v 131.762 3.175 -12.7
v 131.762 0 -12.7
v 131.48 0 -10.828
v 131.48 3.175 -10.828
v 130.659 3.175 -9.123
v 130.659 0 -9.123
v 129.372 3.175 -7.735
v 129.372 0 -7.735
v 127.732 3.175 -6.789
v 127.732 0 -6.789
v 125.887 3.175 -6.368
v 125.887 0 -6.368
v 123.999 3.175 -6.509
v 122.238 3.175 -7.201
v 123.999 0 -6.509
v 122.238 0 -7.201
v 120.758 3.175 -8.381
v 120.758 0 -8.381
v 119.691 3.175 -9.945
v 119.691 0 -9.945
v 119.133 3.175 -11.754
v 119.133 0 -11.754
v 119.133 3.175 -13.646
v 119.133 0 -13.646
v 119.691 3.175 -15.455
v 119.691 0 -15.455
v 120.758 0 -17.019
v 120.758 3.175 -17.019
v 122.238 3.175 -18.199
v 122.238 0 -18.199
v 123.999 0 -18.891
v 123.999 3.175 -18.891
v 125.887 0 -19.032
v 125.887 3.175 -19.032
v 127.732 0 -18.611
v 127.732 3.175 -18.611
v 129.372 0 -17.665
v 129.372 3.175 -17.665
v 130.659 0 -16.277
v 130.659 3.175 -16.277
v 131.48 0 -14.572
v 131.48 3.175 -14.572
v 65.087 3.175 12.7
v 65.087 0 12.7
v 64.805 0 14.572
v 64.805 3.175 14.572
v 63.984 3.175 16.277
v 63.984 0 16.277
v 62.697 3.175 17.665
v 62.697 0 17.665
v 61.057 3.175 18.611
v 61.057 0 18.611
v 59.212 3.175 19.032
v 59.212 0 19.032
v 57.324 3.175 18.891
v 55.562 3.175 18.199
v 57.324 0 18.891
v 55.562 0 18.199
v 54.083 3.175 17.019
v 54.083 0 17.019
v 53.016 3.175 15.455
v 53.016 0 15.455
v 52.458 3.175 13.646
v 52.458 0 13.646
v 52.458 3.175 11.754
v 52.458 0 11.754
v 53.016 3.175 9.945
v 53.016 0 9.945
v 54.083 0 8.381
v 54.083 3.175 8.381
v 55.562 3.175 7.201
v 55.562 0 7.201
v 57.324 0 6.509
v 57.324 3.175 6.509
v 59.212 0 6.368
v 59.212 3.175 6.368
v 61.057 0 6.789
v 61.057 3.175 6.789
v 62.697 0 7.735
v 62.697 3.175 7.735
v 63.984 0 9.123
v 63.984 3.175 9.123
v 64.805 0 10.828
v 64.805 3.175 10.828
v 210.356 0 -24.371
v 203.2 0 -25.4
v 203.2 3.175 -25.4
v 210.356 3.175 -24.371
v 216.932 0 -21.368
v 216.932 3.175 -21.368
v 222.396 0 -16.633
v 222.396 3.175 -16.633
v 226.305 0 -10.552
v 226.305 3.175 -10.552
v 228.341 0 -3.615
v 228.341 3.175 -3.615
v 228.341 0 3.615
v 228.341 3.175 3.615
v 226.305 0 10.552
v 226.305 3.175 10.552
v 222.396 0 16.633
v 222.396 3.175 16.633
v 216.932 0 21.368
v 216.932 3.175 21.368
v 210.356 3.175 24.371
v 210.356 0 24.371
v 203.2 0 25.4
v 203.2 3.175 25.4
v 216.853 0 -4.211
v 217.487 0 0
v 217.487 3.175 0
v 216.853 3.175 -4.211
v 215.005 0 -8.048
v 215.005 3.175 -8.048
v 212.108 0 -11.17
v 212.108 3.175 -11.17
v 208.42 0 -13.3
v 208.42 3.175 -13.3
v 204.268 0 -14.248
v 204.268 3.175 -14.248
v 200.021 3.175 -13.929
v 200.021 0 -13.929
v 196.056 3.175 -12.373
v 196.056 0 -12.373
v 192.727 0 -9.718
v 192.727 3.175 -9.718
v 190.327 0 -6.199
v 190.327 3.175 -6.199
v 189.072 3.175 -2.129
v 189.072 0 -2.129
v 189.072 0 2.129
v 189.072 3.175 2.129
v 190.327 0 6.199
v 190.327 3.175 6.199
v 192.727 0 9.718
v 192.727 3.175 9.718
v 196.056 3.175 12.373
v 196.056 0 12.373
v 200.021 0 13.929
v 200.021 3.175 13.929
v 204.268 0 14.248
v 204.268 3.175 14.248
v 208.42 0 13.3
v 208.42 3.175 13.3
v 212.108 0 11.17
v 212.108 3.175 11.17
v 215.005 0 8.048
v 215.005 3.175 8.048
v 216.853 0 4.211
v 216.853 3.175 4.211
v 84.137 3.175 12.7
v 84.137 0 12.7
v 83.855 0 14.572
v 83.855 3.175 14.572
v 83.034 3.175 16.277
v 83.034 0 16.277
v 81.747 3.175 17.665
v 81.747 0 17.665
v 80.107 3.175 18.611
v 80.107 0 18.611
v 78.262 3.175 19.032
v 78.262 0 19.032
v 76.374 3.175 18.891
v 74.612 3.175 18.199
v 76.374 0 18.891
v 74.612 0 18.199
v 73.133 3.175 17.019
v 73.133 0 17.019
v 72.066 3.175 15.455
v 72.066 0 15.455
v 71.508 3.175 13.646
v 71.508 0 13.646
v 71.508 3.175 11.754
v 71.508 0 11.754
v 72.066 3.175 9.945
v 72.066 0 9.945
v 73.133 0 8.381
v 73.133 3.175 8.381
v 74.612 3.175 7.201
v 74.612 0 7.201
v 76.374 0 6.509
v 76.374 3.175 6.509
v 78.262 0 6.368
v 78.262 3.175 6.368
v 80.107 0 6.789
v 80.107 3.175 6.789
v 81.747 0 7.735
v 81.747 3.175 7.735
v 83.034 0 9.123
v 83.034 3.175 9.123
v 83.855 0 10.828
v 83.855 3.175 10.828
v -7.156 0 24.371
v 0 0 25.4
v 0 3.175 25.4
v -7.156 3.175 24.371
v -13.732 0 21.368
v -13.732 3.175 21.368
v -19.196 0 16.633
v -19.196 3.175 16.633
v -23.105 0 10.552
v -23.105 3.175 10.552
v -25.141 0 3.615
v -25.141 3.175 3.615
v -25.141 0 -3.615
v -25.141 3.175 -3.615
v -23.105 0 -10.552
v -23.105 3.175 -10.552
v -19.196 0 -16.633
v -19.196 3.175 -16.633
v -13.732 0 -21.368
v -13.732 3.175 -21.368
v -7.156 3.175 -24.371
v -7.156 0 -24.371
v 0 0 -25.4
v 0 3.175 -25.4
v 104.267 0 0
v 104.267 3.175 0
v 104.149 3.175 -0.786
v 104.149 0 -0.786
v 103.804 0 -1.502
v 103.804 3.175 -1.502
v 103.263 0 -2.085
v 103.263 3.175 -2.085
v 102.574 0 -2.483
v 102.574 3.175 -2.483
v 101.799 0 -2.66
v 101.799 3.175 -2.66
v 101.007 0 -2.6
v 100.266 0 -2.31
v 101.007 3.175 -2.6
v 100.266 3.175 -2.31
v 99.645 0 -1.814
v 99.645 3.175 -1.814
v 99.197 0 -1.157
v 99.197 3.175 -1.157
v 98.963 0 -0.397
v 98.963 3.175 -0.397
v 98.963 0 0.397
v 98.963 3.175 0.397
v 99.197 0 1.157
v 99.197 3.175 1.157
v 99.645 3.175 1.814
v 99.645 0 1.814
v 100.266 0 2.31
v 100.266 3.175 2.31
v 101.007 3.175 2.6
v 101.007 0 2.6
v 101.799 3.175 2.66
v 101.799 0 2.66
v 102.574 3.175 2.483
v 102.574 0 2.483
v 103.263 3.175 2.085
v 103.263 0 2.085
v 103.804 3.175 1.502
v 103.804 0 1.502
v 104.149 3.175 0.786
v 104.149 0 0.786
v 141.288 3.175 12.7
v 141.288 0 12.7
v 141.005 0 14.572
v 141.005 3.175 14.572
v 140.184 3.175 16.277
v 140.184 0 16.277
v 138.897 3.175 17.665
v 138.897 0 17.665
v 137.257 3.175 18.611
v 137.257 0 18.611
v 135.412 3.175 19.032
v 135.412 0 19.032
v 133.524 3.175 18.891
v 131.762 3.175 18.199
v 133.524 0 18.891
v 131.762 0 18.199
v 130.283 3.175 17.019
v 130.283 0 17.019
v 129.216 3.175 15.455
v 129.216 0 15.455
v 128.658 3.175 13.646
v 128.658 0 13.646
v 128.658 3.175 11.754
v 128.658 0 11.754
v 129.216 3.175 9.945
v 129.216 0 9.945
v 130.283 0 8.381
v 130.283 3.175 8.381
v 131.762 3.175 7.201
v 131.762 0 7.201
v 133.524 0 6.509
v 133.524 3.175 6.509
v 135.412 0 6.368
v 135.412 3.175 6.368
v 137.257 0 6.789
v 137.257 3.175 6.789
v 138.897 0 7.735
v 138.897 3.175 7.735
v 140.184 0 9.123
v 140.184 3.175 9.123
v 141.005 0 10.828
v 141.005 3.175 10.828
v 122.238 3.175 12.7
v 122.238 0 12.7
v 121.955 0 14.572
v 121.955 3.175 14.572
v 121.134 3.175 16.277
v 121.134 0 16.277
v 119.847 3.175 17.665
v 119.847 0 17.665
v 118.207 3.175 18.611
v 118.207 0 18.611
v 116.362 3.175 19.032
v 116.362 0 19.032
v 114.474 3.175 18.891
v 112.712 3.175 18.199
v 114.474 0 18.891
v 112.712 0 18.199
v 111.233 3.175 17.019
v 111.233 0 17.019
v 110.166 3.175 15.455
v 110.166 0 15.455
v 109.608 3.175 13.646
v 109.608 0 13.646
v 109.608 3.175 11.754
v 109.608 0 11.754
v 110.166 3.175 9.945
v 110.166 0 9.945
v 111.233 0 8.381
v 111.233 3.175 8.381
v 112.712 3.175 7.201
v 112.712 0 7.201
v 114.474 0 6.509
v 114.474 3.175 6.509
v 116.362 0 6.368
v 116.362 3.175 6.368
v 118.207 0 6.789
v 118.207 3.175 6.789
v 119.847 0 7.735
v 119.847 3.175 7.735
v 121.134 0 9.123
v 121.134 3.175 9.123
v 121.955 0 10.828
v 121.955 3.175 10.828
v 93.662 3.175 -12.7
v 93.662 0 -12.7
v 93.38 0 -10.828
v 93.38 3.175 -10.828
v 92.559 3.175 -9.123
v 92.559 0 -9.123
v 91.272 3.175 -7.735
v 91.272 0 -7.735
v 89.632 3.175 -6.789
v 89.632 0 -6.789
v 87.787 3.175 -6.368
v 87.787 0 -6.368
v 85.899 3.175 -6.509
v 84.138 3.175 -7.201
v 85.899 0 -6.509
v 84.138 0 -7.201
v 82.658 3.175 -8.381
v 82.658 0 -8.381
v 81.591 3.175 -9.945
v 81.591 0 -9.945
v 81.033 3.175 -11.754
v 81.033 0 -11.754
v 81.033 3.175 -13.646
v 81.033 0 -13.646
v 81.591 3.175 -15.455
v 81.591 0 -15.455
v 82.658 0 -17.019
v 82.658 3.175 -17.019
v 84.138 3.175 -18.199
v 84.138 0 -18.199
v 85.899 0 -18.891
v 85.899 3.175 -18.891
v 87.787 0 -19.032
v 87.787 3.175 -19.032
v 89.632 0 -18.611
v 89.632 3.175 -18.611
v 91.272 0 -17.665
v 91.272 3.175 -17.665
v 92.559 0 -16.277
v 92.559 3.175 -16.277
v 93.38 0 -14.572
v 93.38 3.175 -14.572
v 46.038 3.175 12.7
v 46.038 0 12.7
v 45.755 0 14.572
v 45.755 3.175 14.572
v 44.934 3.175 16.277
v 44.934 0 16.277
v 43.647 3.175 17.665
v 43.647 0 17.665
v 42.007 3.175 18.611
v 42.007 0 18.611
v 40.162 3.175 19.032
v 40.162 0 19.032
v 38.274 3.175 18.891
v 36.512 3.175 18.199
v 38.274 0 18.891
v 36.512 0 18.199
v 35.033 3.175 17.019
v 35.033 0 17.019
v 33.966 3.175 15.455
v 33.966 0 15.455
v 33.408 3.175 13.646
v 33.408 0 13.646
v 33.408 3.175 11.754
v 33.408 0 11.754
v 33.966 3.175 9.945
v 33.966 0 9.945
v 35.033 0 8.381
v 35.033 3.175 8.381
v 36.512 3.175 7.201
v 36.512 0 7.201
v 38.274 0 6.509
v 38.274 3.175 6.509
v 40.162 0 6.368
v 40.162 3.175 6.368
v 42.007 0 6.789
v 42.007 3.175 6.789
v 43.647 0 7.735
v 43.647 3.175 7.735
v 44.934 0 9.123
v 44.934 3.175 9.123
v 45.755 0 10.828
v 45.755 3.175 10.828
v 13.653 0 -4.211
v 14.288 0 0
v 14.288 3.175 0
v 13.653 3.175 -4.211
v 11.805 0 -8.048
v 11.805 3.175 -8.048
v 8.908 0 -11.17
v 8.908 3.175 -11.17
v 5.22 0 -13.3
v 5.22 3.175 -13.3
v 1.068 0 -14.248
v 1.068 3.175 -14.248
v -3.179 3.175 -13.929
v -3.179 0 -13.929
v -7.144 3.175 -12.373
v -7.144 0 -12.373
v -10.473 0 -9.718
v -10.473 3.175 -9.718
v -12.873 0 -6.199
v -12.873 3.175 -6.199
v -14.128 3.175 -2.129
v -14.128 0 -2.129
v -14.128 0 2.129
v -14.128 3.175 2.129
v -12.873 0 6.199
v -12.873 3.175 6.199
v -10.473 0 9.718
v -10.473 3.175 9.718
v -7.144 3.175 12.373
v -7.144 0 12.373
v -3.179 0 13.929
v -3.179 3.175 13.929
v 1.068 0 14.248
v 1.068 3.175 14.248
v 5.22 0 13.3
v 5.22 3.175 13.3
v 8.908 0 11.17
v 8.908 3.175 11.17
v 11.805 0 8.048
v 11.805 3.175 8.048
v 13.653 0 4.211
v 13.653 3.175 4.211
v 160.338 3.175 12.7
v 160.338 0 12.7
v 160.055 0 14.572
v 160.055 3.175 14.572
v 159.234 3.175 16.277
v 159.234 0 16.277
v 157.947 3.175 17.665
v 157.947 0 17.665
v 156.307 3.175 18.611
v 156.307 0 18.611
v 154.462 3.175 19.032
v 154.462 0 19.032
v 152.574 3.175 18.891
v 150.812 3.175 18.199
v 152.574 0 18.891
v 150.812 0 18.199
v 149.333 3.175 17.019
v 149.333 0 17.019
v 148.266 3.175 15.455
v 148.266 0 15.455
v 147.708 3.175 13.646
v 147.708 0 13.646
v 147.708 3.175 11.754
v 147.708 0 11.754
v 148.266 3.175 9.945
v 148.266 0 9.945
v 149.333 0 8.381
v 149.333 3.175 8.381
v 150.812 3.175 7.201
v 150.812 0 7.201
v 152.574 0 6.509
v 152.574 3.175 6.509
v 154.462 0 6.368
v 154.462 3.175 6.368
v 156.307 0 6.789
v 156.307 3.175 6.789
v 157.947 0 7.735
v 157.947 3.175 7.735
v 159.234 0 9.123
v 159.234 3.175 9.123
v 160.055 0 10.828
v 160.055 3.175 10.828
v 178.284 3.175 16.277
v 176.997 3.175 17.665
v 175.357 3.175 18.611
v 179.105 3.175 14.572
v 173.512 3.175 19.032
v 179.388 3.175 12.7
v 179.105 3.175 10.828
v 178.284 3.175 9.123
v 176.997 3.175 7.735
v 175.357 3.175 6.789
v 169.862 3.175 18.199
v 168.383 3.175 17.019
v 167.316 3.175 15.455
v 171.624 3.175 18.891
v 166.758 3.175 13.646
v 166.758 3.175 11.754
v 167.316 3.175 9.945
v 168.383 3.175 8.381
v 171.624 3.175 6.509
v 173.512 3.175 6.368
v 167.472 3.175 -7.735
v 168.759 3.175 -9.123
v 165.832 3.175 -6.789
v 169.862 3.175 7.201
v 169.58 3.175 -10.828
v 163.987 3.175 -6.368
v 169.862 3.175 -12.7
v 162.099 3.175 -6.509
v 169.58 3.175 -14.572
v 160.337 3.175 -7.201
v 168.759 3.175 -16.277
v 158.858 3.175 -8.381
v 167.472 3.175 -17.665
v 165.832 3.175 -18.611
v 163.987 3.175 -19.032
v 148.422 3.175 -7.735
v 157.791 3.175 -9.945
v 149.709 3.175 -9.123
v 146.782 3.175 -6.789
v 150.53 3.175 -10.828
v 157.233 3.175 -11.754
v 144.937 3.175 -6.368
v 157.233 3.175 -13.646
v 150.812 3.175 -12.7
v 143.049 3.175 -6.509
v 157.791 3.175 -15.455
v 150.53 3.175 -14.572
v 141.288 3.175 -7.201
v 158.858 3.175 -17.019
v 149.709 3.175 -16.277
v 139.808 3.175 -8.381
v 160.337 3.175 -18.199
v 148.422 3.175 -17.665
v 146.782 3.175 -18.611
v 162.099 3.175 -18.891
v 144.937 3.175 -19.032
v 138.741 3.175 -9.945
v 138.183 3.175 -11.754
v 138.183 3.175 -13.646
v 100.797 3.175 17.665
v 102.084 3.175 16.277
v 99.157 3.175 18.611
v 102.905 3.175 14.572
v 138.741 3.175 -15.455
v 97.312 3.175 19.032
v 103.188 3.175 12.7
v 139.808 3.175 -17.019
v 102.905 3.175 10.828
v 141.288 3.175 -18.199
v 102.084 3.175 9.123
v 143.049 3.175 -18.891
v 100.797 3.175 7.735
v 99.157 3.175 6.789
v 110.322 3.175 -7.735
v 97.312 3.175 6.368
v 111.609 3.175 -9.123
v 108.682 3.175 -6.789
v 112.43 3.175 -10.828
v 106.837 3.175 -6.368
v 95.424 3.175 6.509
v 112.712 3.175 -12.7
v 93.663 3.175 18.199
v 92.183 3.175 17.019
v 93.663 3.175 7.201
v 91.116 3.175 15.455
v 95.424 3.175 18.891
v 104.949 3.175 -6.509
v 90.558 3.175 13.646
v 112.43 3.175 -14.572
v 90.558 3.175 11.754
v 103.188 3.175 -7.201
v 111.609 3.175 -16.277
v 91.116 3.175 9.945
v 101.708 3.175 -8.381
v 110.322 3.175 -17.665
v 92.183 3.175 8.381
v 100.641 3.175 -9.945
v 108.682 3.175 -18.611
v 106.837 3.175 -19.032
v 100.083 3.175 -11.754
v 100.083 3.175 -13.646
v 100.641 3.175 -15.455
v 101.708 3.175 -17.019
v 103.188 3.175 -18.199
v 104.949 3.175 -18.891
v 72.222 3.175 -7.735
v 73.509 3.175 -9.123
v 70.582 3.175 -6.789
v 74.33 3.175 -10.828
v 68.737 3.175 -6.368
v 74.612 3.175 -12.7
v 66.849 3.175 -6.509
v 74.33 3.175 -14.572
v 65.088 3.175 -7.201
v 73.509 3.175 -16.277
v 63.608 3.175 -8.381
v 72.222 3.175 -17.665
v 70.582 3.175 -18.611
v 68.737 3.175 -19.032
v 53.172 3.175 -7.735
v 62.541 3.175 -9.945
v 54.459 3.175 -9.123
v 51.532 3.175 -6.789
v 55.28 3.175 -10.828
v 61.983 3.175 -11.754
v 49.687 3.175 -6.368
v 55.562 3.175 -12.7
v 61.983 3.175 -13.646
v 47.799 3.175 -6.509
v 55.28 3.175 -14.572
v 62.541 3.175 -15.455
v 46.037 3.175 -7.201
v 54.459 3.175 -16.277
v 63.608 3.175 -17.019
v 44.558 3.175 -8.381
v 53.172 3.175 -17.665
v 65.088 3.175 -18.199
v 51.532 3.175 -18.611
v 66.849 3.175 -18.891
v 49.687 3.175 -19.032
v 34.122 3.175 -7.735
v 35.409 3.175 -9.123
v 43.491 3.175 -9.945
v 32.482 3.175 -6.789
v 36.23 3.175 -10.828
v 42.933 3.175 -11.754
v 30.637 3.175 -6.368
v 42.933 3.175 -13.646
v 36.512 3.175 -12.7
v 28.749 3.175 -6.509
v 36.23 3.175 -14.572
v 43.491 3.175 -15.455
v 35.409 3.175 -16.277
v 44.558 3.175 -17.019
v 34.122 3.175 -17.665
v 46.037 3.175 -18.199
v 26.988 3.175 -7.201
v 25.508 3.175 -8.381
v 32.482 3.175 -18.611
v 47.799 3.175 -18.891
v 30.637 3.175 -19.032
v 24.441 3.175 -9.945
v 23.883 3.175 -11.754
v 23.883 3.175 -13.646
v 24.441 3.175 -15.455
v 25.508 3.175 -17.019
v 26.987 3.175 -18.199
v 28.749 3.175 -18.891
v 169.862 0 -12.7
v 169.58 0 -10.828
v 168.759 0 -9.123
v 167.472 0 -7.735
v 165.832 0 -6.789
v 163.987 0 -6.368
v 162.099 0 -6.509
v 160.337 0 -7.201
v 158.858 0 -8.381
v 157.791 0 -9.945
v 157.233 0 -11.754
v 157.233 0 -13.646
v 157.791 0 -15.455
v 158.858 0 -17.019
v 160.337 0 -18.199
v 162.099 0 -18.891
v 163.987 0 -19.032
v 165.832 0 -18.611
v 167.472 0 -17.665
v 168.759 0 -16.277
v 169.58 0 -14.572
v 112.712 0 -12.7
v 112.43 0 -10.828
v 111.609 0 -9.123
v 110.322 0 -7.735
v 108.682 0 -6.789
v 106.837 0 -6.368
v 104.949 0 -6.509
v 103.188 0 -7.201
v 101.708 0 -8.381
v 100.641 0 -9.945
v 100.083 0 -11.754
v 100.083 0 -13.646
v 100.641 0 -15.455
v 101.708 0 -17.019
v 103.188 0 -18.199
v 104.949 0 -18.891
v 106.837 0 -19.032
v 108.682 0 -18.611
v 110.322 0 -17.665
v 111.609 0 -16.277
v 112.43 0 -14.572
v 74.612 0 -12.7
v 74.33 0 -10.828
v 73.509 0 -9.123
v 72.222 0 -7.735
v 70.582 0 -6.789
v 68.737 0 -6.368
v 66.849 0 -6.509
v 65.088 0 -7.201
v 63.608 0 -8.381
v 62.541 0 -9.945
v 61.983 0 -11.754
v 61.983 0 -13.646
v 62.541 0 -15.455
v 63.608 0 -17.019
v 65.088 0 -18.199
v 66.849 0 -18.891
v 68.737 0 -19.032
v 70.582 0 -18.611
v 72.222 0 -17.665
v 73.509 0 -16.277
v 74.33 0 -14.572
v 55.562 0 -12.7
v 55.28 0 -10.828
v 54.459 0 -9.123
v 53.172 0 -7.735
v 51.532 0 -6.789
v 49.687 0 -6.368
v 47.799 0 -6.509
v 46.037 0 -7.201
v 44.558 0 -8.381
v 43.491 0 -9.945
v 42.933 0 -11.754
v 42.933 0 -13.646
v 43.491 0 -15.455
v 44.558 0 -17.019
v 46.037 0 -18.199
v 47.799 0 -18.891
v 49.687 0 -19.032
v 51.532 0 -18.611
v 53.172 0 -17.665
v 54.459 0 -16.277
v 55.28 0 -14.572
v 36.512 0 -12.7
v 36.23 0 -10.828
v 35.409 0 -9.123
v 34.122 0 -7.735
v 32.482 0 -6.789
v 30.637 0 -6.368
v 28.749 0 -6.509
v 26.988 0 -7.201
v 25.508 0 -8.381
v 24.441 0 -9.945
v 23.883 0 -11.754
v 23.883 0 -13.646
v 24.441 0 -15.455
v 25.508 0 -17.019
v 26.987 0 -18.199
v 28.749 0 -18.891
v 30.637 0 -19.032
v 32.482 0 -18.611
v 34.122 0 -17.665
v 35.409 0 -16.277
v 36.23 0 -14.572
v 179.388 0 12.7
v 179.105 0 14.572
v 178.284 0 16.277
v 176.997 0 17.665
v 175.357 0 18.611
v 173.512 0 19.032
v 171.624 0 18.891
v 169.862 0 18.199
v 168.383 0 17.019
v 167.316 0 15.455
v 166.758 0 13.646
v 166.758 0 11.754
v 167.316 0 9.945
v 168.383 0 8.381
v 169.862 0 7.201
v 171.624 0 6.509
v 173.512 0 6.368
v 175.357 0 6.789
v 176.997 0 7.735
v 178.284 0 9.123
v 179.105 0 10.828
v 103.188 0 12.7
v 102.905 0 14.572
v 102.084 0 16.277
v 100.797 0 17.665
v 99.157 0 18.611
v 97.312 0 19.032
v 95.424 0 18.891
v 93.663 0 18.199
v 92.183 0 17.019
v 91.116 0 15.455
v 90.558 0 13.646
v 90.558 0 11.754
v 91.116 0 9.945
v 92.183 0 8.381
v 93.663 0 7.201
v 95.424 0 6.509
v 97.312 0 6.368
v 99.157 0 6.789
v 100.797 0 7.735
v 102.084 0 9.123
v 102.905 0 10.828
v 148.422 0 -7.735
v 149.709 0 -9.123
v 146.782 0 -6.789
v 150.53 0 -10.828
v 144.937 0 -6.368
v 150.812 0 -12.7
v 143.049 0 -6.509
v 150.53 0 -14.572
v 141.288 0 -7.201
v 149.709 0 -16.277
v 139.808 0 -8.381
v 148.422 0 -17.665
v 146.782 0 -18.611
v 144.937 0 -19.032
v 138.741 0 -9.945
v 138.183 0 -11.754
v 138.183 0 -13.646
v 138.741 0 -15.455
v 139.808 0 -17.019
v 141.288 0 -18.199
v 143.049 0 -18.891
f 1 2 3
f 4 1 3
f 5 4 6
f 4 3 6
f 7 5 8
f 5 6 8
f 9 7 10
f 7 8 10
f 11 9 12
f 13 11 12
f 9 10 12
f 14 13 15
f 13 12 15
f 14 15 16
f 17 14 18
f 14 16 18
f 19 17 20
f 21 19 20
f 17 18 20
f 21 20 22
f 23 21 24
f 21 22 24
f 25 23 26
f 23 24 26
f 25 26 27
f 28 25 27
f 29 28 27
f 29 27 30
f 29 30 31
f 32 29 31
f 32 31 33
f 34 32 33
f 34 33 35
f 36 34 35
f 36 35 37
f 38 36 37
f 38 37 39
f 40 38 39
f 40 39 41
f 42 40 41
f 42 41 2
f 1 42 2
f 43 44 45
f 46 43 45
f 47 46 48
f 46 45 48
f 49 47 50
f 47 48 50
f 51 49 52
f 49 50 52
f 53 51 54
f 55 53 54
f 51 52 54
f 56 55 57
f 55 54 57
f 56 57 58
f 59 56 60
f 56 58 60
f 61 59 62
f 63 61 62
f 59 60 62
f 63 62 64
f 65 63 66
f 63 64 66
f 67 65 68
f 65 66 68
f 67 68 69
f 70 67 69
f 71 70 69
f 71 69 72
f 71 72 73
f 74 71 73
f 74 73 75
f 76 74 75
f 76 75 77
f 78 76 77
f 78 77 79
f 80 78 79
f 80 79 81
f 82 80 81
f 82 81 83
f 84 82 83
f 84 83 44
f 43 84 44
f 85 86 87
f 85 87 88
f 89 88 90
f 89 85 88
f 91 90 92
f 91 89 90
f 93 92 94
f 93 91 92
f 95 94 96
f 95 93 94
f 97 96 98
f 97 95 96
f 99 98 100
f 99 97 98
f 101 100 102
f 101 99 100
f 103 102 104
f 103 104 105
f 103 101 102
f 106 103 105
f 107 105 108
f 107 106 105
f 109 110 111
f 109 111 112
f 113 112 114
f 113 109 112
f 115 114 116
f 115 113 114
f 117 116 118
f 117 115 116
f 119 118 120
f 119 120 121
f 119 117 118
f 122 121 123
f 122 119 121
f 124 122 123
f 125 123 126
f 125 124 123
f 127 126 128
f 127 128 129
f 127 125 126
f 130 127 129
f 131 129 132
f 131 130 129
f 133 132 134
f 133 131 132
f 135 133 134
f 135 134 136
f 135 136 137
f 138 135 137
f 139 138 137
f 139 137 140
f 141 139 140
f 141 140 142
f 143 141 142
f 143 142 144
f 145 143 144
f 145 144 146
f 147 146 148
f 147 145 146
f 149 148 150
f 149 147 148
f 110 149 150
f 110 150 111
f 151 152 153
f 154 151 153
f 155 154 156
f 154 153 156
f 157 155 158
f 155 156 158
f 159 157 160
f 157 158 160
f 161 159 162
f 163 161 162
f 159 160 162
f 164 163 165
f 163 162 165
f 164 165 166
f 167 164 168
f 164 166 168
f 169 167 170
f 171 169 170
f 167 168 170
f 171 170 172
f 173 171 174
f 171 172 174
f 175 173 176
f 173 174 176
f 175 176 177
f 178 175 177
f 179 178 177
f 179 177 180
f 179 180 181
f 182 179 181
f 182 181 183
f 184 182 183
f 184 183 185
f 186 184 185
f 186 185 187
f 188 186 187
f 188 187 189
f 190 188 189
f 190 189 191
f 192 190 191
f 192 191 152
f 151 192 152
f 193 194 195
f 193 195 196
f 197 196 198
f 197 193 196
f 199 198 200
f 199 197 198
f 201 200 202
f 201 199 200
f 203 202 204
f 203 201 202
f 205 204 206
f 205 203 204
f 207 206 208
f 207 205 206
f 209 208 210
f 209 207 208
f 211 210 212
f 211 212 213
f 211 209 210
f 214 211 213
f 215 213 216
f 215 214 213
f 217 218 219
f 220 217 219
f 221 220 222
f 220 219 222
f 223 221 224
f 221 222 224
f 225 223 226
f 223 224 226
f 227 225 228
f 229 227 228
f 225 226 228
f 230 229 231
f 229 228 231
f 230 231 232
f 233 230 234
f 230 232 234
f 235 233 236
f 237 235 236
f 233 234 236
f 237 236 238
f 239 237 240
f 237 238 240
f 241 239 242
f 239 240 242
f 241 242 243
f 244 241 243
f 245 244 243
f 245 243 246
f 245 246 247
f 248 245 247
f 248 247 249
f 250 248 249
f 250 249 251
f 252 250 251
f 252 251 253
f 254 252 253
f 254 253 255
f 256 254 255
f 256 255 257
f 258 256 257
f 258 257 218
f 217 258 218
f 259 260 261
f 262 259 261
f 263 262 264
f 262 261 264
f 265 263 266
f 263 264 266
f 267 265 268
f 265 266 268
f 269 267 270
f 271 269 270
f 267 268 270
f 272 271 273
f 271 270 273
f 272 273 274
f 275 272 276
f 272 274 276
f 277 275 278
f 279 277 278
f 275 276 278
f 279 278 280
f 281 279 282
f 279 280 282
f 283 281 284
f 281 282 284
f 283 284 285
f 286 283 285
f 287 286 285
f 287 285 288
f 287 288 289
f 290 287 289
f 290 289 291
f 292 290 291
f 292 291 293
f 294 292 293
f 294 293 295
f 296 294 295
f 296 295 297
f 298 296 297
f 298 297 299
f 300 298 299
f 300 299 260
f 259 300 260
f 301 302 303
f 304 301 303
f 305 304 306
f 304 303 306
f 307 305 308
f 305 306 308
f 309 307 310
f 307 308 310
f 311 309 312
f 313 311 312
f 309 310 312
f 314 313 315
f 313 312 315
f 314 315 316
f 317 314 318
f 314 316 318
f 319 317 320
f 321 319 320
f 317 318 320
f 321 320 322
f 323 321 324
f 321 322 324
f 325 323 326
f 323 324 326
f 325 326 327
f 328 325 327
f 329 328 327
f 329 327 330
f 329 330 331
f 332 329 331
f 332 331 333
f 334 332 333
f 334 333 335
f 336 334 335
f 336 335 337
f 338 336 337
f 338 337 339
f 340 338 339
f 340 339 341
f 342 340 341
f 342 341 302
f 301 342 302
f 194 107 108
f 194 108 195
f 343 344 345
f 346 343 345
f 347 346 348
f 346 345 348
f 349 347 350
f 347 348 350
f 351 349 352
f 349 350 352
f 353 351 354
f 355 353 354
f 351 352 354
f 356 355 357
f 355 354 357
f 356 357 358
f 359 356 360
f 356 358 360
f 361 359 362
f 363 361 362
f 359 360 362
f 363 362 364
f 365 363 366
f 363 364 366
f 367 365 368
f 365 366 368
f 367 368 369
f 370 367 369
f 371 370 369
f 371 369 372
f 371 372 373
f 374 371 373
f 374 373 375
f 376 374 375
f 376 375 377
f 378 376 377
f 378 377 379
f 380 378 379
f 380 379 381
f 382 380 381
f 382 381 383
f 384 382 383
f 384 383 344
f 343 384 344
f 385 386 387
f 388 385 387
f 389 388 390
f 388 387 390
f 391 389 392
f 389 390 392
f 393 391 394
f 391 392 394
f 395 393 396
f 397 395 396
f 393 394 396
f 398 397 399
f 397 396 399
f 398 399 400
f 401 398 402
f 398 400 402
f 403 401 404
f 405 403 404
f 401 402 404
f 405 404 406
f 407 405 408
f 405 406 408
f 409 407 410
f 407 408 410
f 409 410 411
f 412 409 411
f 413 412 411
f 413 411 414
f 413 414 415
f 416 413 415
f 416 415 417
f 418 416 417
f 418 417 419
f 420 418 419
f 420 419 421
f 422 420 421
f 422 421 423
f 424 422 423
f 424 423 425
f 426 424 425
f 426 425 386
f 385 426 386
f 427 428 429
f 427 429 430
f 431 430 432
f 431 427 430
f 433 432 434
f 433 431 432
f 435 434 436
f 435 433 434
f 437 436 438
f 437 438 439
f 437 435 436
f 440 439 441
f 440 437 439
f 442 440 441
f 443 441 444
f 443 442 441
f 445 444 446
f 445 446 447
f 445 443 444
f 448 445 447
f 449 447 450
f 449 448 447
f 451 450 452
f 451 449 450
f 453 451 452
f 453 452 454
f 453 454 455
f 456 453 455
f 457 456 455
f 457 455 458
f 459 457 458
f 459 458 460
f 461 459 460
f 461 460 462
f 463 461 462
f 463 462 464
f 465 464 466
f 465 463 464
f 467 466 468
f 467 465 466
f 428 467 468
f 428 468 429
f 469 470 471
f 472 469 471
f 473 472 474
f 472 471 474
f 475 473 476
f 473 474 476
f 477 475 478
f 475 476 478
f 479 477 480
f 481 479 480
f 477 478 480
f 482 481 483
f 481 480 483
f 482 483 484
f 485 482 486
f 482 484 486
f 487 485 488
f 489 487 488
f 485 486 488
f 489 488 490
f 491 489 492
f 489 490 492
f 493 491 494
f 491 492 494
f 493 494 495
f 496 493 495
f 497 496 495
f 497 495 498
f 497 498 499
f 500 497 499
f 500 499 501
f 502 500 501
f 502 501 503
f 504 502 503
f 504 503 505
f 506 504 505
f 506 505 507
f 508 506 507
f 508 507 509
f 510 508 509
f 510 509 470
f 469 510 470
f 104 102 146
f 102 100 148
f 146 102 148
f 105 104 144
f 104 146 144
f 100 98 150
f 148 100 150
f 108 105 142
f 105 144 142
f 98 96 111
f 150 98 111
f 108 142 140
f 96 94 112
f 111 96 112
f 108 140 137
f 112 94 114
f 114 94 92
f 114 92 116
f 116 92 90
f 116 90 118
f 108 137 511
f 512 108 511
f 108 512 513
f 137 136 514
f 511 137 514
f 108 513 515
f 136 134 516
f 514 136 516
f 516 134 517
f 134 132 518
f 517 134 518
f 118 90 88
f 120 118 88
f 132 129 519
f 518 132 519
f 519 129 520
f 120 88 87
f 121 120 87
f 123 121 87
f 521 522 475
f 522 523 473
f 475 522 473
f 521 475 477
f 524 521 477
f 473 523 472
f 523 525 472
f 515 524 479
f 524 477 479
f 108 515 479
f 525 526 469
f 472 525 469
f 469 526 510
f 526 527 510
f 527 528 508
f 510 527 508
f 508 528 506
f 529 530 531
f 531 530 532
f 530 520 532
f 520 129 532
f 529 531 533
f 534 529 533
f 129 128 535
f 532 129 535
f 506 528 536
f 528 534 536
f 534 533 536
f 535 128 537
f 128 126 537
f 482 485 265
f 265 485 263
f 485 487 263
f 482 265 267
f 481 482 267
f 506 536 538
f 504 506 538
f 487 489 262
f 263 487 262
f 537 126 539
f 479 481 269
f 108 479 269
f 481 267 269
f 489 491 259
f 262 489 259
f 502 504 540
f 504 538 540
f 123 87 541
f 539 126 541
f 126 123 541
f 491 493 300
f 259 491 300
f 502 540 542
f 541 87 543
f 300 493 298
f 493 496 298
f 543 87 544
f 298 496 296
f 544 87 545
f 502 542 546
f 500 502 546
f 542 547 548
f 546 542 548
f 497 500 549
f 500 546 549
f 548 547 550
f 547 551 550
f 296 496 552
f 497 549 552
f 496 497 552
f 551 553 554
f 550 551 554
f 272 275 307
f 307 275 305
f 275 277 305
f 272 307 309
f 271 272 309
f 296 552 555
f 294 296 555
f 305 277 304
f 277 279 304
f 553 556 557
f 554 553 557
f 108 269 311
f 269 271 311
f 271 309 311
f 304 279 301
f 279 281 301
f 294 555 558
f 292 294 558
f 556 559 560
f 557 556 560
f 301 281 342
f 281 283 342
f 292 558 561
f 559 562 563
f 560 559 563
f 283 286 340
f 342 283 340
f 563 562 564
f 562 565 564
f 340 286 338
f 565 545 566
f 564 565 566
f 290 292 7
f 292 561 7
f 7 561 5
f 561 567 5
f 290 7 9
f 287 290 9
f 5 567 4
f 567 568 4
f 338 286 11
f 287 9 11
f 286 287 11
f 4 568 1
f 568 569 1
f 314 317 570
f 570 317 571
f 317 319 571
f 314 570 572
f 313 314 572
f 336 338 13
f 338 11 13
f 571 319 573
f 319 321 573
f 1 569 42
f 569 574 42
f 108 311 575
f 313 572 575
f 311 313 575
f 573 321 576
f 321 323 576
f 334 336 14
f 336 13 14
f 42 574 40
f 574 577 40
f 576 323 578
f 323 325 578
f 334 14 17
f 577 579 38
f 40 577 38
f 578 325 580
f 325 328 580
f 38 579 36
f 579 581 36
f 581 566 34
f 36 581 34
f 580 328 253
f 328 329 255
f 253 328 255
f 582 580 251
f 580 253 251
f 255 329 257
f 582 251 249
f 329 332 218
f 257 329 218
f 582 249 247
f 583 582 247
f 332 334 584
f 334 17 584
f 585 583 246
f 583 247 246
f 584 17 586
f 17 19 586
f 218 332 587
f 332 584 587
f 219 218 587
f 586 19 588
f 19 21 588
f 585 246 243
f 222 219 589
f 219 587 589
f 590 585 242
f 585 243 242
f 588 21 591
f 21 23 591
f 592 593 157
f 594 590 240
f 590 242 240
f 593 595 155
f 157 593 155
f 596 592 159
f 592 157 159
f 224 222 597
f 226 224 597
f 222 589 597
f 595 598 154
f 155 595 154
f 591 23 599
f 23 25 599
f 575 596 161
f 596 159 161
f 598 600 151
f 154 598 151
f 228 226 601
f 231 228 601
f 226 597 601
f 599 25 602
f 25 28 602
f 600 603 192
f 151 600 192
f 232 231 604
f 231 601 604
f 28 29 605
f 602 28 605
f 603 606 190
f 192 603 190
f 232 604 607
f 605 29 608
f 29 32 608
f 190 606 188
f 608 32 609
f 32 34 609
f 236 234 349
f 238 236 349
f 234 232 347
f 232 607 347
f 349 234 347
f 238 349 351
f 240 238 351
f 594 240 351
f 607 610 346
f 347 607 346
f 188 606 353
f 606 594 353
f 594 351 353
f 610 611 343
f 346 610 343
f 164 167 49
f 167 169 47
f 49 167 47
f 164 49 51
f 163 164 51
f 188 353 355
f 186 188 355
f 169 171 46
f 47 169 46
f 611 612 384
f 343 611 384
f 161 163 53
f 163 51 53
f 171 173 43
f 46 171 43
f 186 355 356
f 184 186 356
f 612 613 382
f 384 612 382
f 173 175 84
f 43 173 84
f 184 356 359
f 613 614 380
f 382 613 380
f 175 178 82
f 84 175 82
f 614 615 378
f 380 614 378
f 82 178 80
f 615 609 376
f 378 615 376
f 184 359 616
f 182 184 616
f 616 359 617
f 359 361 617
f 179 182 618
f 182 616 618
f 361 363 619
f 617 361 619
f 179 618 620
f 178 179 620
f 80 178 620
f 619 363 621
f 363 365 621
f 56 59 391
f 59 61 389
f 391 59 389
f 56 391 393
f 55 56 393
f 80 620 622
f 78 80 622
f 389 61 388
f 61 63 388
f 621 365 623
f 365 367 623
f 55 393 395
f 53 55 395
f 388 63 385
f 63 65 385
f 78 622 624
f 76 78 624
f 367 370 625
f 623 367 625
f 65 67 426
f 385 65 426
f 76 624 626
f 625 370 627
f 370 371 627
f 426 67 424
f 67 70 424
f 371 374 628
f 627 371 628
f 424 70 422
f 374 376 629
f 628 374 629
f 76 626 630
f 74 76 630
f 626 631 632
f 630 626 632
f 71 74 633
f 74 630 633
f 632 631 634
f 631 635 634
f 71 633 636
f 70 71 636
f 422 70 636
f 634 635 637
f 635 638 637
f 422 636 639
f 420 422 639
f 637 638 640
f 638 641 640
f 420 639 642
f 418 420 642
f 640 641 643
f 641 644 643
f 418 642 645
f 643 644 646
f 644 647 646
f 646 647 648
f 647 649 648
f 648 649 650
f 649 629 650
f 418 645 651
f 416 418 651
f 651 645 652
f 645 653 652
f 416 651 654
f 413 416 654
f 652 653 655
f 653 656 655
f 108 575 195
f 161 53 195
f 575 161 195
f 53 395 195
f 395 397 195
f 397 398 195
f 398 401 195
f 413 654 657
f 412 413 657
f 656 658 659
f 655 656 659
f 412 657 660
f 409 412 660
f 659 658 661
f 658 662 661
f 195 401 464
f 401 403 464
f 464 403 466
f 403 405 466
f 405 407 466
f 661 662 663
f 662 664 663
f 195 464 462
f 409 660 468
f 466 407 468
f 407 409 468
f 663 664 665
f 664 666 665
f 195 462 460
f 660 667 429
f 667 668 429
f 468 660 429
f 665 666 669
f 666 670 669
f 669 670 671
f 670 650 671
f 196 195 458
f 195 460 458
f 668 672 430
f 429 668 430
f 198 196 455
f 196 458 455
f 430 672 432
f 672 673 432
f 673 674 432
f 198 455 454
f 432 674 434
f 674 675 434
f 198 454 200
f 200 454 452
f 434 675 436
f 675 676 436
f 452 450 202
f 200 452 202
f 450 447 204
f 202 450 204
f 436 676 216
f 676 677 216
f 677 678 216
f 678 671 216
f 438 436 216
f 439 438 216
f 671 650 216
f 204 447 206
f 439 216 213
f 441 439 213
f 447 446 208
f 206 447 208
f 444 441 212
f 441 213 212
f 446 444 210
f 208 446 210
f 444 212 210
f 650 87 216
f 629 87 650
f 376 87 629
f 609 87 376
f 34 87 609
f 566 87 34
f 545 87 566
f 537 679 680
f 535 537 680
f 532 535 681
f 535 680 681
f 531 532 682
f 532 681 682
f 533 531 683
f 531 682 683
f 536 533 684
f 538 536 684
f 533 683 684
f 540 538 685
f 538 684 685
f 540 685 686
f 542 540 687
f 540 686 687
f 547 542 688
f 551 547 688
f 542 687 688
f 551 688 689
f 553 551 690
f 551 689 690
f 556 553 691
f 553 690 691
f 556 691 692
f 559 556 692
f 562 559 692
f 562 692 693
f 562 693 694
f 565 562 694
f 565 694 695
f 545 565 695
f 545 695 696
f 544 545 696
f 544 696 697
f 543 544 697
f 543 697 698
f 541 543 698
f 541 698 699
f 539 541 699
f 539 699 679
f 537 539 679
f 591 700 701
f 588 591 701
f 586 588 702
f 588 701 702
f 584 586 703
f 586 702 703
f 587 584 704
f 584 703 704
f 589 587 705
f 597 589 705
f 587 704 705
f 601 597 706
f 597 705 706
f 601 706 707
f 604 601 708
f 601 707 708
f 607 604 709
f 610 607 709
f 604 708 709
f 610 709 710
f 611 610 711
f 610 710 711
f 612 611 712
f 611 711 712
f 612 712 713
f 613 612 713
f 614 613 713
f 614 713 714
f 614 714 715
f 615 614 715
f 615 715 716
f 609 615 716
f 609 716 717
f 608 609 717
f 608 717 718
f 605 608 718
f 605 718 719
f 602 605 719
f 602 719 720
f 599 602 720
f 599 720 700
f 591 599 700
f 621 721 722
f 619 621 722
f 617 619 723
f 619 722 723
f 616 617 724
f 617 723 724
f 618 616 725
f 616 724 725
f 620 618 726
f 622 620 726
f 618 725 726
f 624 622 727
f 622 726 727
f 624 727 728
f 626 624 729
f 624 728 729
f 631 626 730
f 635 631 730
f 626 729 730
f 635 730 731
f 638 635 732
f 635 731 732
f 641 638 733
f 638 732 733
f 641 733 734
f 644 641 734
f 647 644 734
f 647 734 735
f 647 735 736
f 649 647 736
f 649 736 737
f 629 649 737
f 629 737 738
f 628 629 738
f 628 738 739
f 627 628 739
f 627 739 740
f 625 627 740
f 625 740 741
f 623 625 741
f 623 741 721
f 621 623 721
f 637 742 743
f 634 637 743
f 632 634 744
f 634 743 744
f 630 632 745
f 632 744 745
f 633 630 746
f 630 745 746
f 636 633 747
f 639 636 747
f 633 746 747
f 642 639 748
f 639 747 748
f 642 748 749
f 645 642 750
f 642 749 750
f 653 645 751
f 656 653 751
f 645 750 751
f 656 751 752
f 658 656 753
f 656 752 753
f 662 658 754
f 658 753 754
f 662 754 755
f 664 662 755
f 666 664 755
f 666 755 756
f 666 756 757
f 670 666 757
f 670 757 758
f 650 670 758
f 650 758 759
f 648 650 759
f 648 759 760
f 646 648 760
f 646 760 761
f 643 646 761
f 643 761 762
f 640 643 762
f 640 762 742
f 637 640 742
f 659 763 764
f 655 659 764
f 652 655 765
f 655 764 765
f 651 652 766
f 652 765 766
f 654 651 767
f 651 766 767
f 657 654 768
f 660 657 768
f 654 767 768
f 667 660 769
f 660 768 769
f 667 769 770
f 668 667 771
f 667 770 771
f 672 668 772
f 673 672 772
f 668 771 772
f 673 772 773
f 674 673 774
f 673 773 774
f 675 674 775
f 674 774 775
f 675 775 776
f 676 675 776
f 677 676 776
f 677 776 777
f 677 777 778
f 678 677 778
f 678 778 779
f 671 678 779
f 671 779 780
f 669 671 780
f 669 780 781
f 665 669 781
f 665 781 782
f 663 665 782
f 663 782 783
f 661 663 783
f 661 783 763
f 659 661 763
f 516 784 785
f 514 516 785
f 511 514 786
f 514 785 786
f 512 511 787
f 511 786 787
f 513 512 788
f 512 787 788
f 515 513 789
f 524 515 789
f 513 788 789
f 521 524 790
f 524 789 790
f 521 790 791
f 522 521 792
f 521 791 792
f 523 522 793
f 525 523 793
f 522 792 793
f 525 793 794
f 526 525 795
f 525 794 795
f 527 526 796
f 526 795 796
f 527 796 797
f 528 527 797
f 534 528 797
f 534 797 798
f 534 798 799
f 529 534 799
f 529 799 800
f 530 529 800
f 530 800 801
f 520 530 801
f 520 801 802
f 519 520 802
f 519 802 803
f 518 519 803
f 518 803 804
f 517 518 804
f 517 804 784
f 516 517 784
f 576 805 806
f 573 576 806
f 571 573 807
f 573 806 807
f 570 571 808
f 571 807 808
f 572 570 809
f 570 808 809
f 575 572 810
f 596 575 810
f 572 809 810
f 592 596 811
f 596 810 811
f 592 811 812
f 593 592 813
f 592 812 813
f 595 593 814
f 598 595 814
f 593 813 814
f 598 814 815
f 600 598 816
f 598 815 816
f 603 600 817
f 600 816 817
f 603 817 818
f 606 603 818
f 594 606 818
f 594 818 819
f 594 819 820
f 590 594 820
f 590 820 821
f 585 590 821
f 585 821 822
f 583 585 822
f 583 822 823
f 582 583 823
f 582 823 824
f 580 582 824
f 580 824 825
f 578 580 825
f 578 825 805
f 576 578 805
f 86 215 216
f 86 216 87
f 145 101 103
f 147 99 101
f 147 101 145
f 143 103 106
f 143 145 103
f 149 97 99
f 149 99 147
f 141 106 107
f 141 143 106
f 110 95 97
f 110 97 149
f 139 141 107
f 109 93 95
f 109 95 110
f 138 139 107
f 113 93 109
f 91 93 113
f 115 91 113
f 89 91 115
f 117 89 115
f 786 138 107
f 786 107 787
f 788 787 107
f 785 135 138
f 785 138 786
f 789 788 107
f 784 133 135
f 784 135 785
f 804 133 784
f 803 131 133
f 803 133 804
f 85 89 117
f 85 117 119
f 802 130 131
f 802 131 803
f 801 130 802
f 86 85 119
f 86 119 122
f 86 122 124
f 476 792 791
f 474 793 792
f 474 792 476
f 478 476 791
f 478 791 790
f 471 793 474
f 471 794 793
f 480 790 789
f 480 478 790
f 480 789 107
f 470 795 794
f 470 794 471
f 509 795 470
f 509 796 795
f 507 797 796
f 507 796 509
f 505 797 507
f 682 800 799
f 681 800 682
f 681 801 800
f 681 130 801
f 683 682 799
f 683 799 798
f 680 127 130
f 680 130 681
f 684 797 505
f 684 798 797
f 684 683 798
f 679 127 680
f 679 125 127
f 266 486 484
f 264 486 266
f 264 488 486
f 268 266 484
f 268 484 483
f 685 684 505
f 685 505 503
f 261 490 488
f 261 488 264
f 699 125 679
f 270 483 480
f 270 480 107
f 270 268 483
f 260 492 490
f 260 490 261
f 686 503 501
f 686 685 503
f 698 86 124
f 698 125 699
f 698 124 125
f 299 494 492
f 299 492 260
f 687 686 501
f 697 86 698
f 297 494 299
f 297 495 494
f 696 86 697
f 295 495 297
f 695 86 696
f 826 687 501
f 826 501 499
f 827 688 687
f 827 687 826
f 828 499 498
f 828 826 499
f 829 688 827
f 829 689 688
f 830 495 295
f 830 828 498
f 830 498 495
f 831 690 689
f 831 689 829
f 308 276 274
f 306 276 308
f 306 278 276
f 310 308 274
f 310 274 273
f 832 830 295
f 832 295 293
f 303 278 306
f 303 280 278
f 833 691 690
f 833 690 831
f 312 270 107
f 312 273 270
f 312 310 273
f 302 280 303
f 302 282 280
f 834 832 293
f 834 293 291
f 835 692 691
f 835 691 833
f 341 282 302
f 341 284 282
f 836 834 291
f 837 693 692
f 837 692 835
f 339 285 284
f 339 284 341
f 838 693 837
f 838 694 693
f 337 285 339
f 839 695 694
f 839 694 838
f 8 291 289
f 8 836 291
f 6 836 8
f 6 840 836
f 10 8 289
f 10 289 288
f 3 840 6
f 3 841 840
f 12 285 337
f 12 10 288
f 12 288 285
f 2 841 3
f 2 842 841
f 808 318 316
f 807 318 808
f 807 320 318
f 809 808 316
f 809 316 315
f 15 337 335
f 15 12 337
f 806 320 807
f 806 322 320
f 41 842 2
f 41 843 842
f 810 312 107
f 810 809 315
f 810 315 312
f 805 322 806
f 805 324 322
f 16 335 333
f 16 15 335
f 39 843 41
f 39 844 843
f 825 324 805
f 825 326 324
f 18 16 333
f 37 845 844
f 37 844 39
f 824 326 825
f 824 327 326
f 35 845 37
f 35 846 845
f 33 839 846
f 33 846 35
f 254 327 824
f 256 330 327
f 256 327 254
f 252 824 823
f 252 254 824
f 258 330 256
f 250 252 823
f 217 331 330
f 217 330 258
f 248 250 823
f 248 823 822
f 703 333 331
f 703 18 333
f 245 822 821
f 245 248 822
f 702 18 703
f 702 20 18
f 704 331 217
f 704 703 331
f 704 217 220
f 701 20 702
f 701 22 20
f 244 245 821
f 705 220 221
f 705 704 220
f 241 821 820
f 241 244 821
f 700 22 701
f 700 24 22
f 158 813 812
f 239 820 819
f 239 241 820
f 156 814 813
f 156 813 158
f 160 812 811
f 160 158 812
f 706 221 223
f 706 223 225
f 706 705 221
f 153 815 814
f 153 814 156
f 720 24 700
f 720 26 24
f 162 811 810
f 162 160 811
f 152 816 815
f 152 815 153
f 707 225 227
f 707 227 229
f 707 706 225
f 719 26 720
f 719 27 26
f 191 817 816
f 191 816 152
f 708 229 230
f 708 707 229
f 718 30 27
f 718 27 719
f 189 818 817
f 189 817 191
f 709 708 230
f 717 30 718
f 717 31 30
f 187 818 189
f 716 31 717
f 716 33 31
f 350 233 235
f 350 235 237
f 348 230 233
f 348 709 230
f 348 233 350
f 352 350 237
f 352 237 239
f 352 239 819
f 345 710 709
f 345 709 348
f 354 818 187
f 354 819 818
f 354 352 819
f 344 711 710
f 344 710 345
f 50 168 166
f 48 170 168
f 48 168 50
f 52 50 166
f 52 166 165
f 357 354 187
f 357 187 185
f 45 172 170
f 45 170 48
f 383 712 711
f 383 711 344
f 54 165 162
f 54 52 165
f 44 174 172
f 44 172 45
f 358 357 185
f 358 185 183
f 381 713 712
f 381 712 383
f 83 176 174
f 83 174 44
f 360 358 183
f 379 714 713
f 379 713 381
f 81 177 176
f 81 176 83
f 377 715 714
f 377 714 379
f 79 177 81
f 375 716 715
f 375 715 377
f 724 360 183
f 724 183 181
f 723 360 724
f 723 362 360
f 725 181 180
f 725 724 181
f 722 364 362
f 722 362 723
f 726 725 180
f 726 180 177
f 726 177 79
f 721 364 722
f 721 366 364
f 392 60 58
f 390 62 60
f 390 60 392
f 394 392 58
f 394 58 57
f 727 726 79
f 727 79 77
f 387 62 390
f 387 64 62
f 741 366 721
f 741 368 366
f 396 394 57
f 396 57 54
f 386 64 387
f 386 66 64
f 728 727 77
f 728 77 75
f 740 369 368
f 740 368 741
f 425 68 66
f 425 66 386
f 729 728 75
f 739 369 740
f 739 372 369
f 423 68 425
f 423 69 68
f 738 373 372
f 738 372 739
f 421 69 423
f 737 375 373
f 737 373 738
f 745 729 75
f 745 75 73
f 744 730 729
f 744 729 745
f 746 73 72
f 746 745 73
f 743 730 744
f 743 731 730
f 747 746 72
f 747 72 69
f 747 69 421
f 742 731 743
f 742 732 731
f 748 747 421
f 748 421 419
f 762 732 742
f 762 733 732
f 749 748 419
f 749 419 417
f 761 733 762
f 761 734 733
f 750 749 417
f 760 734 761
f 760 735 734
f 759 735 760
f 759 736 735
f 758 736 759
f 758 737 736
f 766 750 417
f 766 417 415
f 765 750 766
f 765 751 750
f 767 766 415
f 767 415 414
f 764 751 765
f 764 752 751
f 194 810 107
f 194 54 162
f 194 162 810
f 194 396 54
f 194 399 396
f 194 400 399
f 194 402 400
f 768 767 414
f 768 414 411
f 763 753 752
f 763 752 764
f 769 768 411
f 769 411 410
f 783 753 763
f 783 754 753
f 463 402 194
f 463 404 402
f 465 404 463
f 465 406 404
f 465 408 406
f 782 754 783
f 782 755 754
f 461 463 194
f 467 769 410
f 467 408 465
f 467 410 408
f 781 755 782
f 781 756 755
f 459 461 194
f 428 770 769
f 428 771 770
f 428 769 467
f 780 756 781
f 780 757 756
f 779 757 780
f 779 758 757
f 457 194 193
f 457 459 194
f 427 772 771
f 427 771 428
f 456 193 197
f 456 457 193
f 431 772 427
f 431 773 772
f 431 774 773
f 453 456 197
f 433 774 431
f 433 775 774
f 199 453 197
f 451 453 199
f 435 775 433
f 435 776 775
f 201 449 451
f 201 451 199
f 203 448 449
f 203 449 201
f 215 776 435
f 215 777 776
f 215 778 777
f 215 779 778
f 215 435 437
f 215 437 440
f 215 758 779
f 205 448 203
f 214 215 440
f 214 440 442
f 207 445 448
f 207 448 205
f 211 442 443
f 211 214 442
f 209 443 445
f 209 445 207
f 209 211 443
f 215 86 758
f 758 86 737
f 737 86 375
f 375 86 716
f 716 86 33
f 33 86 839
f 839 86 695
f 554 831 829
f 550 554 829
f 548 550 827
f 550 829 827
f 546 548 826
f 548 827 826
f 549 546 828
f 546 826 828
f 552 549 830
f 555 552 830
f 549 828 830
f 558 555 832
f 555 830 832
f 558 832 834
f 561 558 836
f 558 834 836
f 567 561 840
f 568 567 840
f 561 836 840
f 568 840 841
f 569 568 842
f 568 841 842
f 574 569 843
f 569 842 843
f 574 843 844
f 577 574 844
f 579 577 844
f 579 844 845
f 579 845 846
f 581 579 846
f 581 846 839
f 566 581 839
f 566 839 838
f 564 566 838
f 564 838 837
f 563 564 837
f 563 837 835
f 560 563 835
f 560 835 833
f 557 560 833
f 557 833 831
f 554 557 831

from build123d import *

# Parameters (mm, degrees)
SKETCH1_R           = 14.2875
BOSS_EXTRUDE1_DEPTH = 3.175
CUT_EXTRUDE1_REACH  = 5.175
SKETCH2_R           = 2.667
CUT_EXTRUDE2_REACH  = 5.175
SKETCH4_R           = 6.35


with BuildPart() as part:
    # Sketch1 → Boss-Extrude1 (new body)
    with BuildSketch(Plane(origin=(0, 0, 0), x_dir=(1, 0, 0), z_dir=(0, 1, 0))):
        with BuildLine():
            Line((0, 25.4), (203.2, 25.4))
            ThreePointArc((203.2, 25.4), (228.6, 0), (203.2, -25.4))
            Line((203.2, -25.4), (0, -25.4))
            ThreePointArc((0, -25.4), (-25.4, 0), (0, 25.4))
        make_face()
        Circle(SKETCH1_R, mode=Mode.SUBTRACT)
        with Locations((203.2, 0)):
            Circle(SKETCH1_R, mode=Mode.SUBTRACT)
    extrude(amount=BOSS_EXTRUDE1_DEPTH)

    # Sketch2 → Cut-Extrude1 (cut, up to next)
    with BuildSketch(Plane(origin=(0, 3.175, 0), x_dir=(1, 0, 0), z_dir=(0, 1, 0)), mode=Mode.PRIVATE) as cut_extrude1_sk1:
        with Locations((101.6, 0)):
            Circle(SKETCH2_R)
    cut_extrude1_tool1 = extrude(cut_extrude1_sk1.sketch, amount=-CUT_EXTRUDE1_REACH, mode=Mode.PRIVATE) & part.part
    add(cut_extrude1_tool1.solids().sort_by_distance((101.6, 3.175, 0))[0], mode=Mode.SUBTRACT)

    # Sketch4 → Cut-Extrude2 (cut, up to next)
    with BuildSketch(Plane.XZ, mode=Mode.PRIVATE) as cut_extrude2_sk1:
        with Locations((30.1625, -12.7)):
            Circle(SKETCH4_R)
    cut_extrude2_tool1 = extrude(cut_extrude2_sk1.sketch, amount=-CUT_EXTRUDE2_REACH, mode=Mode.PRIVATE) & part.part
    add(cut_extrude2_tool1.solids().sort_by_distance((30.1625, 0, -12.7))[0], mode=Mode.SUBTRACT)
    # Sketch4 → Cut-Extrude2 (cut, up to next)
    with BuildSketch(Plane.XZ, mode=Mode.PRIVATE) as cut_extrude2_sk2:
        with Locations((49.2125, -12.7)):
            Circle(SKETCH4_R)
    cut_extrude2_tool2 = extrude(cut_extrude2_sk2.sketch, amount=-CUT_EXTRUDE2_REACH, mode=Mode.PRIVATE) & part.part
    add(cut_extrude2_tool2.solids().sort_by_distance((49.2125, 0, -12.7))[0], mode=Mode.SUBTRACT)
    # Sketch4 → Cut-Extrude2 (cut, up to next)
    with BuildSketch(Plane.XZ, mode=Mode.PRIVATE) as cut_extrude2_sk3:
        with Locations((68.2625, -12.7)):
            Circle(SKETCH4_R)
    cut_extrude2_tool3 = extrude(cut_extrude2_sk3.sketch, amount=-CUT_EXTRUDE2_REACH, mode=Mode.PRIVATE) & part.part
    add(cut_extrude2_tool3.solids().sort_by_distance((68.2625, 0, -12.7))[0], mode=Mode.SUBTRACT)
    # Sketch4 → Cut-Extrude2 (cut, up to next)
    with BuildSketch(Plane.XZ, mode=Mode.PRIVATE) as cut_extrude2_sk4:
        with Locations((87.3125, -12.7)):
            Circle(SKETCH4_R)
    cut_extrude2_tool4 = extrude(cut_extrude2_sk4.sketch, amount=-CUT_EXTRUDE2_REACH, mode=Mode.PRIVATE) & part.part
    add(cut_extrude2_tool4.solids().sort_by_distance((87.3125, 0, -12.7))[0], mode=Mode.SUBTRACT)
    # Sketch4 → Cut-Extrude2 (cut, up to next)
    with BuildSketch(Plane.XZ, mode=Mode.PRIVATE) as cut_extrude2_sk5:
        with Locations((106.3625, -12.7)):
            Circle(SKETCH4_R)
    cut_extrude2_tool5 = extrude(cut_extrude2_sk5.sketch, amount=-CUT_EXTRUDE2_REACH, mode=Mode.PRIVATE) & part.part
    add(cut_extrude2_tool5.solids().sort_by_distance((106.3625, 0, -12.7))[0], mode=Mode.SUBTRACT)
    # Sketch4 → Cut-Extrude2 (cut, up to next)
    with BuildSketch(Plane.XZ, mode=Mode.PRIVATE) as cut_extrude2_sk6:
        with Locations((125.4125, -12.7)):
            Circle(SKETCH4_R)
    cut_extrude2_tool6 = extrude(cut_extrude2_sk6.sketch, amount=-CUT_EXTRUDE2_REACH, mode=Mode.PRIVATE) & part.part
    add(cut_extrude2_tool6.solids().sort_by_distance((125.4125, 0, -12.7))[0], mode=Mode.SUBTRACT)
    # Sketch4 → Cut-Extrude2 (cut, up to next)
    with BuildSketch(Plane.XZ, mode=Mode.PRIVATE) as cut_extrude2_sk7:
        with Locations((144.4625, -12.7)):
            Circle(SKETCH4_R)
    cut_extrude2_tool7 = extrude(cut_extrude2_sk7.sketch, amount=-CUT_EXTRUDE2_REACH, mode=Mode.PRIVATE) & part.part
    add(cut_extrude2_tool7.solids().sort_by_distance((144.4625, 0, -12.7))[0], mode=Mode.SUBTRACT)
    # Sketch4 → Cut-Extrude2 (cut, up to next)
    with BuildSketch(Plane.XZ, mode=Mode.PRIVATE) as cut_extrude2_sk8:
        with Locations((163.5125, -12.7)):
            Circle(SKETCH4_R)
    cut_extrude2_tool8 = extrude(cut_extrude2_sk8.sketch, amount=-CUT_EXTRUDE2_REACH, mode=Mode.PRIVATE) & part.part
    add(cut_extrude2_tool8.solids().sort_by_distance((163.5125, 0, -12.7))[0], mode=Mode.SUBTRACT)
    # Sketch4 → Cut-Extrude2 (cut, up to next)
    with BuildSketch(Plane.XZ, mode=Mode.PRIVATE) as cut_extrude2_sk9:
        with Locations((39.6875, 12.7)):
            Circle(SKETCH4_R)
    cut_extrude2_tool9 = extrude(cut_extrude2_sk9.sketch, amount=-CUT_EXTRUDE2_REACH, mode=Mode.PRIVATE) & part.part
    add(cut_extrude2_tool9.solids().sort_by_distance((39.6875, 0, 12.7))[0], mode=Mode.SUBTRACT)
    # Sketch4 → Cut-Extrude2 (cut, up to next)
    with BuildSketch(Plane.XZ, mode=Mode.PRIVATE) as cut_extrude2_sk10:
        with Locations((58.7375, 12.7)):
            Circle(SKETCH4_R)
    cut_extrude2_tool10 = extrude(cut_extrude2_sk10.sketch, amount=-CUT_EXTRUDE2_REACH, mode=Mode.PRIVATE) & part.part
    add(cut_extrude2_tool10.solids().sort_by_distance((58.7375, 0, 12.7))[0], mode=Mode.SUBTRACT)
    # Sketch4 → Cut-Extrude2 (cut, up to next)
    with BuildSketch(Plane.XZ, mode=Mode.PRIVATE) as cut_extrude2_sk11:
        with Locations((77.7875, 12.7)):
            Circle(SKETCH4_R)
    cut_extrude2_tool11 = extrude(cut_extrude2_sk11.sketch, amount=-CUT_EXTRUDE2_REACH, mode=Mode.PRIVATE) & part.part
    add(cut_extrude2_tool11.solids().sort_by_distance((77.7875, 0, 12.7))[0], mode=Mode.SUBTRACT)
    # Sketch4 → Cut-Extrude2 (cut, up to next)
    with BuildSketch(Plane.XZ, mode=Mode.PRIVATE) as cut_extrude2_sk12:
        with Locations((96.8375, 12.7)):
            Circle(SKETCH4_R)
    cut_extrude2_tool12 = extrude(cut_extrude2_sk12.sketch, amount=-CUT_EXTRUDE2_REACH, mode=Mode.PRIVATE) & part.part
    add(cut_extrude2_tool12.solids().sort_by_distance((96.8375, 0, 12.7))[0], mode=Mode.SUBTRACT)
    # Sketch4 → Cut-Extrude2 (cut, up to next)
    with BuildSketch(Plane.XZ, mode=Mode.PRIVATE) as cut_extrude2_sk13:
        with Locations((115.8875, 12.7)):
            Circle(SKETCH4_R)
    cut_extrude2_tool13 = extrude(cut_extrude2_sk13.sketch, amount=-CUT_EXTRUDE2_REACH, mode=Mode.PRIVATE) & part.part
    add(cut_extrude2_tool13.solids().sort_by_distance((115.8875, 0, 12.7))[0], mode=Mode.SUBTRACT)
    # Sketch4 → Cut-Extrude2 (cut, up to next)
    with BuildSketch(Plane.XZ, mode=Mode.PRIVATE) as cut_extrude2_sk14:
        with Locations((134.9375, 12.7)):
            Circle(SKETCH4_R)
    cut_extrude2_tool14 = extrude(cut_extrude2_sk14.sketch, amount=-CUT_EXTRUDE2_REACH, mode=Mode.PRIVATE) & part.part
    add(cut_extrude2_tool14.solids().sort_by_distance((134.9375, 0, 12.7))[0], mode=Mode.SUBTRACT)
    # Sketch4 → Cut-Extrude2 (cut, up to next)
    with BuildSketch(Plane.XZ, mode=Mode.PRIVATE) as cut_extrude2_sk15:
        with Locations((153.9875, 12.7)):
            Circle(SKETCH4_R)
    cut_extrude2_tool15 = extrude(cut_extrude2_sk15.sketch, amount=-CUT_EXTRUDE2_REACH, mode=Mode.PRIVATE) & part.part
    add(cut_extrude2_tool15.solids().sort_by_distance((153.9875, 0, 12.7))[0], mode=Mode.SUBTRACT)
    # Sketch4 → Cut-Extrude2 (cut, up to next)
    with BuildSketch(Plane.XZ, mode=Mode.PRIVATE) as cut_extrude2_sk16:
        with Locations((173.0375, 12.7)):
            Circle(SKETCH4_R)
    cut_extrude2_tool16 = extrude(cut_extrude2_sk16.sketch, amount=-CUT_EXTRUDE2_REACH, mode=Mode.PRIVATE) & part.part
    add(cut_extrude2_tool16.solids().sort_by_distance((173.0375, 0, 12.7))[0], mode=Mode.SUBTRACT)


solid = part.part
